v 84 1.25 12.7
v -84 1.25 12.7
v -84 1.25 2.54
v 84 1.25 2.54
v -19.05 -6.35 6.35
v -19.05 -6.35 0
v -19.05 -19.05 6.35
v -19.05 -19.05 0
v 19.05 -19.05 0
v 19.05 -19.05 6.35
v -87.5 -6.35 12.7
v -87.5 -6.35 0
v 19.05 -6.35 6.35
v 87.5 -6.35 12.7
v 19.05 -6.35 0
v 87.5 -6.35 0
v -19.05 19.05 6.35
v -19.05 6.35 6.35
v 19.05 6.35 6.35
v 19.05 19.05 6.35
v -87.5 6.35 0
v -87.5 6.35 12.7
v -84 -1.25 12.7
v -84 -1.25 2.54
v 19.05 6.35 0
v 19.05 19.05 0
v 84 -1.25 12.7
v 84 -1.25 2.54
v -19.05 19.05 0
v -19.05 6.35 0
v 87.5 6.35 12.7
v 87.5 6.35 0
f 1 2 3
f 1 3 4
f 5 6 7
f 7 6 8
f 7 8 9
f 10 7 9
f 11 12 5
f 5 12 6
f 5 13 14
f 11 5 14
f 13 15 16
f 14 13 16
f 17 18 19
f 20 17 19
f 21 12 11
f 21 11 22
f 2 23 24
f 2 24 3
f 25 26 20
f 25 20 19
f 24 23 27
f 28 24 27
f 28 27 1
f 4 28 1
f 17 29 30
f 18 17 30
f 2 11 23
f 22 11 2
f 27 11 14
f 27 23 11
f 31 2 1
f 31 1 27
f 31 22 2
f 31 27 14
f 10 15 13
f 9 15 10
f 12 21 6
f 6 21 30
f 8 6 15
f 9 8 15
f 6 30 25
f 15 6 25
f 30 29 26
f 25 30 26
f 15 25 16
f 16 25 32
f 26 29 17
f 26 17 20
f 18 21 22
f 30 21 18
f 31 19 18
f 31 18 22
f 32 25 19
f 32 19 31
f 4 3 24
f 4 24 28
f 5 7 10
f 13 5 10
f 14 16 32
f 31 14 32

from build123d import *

# Parameters (mm, degrees)
F0_W     = 175
F0_H     = 12.7
F1_DEPTH = 12.7
F2_W     = 38.1
F2_H     = 12.7
F3_DEPTH = 6.35
F4_W     = 168
F4_H     = 2.5
F5_DEPTH = 10.16


with BuildPart() as f1:
    # F0 (on Top) → F1 (new body)
    with BuildSketch(Plane.XY):
        Rectangle(F0_W, F0_H)
    extrude(amount=F1_DEPTH)

    # F2 (on face) → F3 (join)
    with BuildSketch(Plane(origin=(0, 0, 0), x_dir=(1, 0, 0), z_dir=(0, 0, -1))):
        with Locations((0, -12.7)):
            Rectangle(F2_W, F2_H)
        with Locations((0, 12.7)):
            Rectangle(F2_W, F2_H)
    extrude(amount=-F3_DEPTH)

    # F4 (on face) → F5 (cut)
    with BuildSketch(Plane.XY.offset(12.7)):
        Rectangle(F4_W, F4_H)
    extrude(amount=-F5_DEPTH, mode=Mode.SUBTRACT)


solid = f1.part
